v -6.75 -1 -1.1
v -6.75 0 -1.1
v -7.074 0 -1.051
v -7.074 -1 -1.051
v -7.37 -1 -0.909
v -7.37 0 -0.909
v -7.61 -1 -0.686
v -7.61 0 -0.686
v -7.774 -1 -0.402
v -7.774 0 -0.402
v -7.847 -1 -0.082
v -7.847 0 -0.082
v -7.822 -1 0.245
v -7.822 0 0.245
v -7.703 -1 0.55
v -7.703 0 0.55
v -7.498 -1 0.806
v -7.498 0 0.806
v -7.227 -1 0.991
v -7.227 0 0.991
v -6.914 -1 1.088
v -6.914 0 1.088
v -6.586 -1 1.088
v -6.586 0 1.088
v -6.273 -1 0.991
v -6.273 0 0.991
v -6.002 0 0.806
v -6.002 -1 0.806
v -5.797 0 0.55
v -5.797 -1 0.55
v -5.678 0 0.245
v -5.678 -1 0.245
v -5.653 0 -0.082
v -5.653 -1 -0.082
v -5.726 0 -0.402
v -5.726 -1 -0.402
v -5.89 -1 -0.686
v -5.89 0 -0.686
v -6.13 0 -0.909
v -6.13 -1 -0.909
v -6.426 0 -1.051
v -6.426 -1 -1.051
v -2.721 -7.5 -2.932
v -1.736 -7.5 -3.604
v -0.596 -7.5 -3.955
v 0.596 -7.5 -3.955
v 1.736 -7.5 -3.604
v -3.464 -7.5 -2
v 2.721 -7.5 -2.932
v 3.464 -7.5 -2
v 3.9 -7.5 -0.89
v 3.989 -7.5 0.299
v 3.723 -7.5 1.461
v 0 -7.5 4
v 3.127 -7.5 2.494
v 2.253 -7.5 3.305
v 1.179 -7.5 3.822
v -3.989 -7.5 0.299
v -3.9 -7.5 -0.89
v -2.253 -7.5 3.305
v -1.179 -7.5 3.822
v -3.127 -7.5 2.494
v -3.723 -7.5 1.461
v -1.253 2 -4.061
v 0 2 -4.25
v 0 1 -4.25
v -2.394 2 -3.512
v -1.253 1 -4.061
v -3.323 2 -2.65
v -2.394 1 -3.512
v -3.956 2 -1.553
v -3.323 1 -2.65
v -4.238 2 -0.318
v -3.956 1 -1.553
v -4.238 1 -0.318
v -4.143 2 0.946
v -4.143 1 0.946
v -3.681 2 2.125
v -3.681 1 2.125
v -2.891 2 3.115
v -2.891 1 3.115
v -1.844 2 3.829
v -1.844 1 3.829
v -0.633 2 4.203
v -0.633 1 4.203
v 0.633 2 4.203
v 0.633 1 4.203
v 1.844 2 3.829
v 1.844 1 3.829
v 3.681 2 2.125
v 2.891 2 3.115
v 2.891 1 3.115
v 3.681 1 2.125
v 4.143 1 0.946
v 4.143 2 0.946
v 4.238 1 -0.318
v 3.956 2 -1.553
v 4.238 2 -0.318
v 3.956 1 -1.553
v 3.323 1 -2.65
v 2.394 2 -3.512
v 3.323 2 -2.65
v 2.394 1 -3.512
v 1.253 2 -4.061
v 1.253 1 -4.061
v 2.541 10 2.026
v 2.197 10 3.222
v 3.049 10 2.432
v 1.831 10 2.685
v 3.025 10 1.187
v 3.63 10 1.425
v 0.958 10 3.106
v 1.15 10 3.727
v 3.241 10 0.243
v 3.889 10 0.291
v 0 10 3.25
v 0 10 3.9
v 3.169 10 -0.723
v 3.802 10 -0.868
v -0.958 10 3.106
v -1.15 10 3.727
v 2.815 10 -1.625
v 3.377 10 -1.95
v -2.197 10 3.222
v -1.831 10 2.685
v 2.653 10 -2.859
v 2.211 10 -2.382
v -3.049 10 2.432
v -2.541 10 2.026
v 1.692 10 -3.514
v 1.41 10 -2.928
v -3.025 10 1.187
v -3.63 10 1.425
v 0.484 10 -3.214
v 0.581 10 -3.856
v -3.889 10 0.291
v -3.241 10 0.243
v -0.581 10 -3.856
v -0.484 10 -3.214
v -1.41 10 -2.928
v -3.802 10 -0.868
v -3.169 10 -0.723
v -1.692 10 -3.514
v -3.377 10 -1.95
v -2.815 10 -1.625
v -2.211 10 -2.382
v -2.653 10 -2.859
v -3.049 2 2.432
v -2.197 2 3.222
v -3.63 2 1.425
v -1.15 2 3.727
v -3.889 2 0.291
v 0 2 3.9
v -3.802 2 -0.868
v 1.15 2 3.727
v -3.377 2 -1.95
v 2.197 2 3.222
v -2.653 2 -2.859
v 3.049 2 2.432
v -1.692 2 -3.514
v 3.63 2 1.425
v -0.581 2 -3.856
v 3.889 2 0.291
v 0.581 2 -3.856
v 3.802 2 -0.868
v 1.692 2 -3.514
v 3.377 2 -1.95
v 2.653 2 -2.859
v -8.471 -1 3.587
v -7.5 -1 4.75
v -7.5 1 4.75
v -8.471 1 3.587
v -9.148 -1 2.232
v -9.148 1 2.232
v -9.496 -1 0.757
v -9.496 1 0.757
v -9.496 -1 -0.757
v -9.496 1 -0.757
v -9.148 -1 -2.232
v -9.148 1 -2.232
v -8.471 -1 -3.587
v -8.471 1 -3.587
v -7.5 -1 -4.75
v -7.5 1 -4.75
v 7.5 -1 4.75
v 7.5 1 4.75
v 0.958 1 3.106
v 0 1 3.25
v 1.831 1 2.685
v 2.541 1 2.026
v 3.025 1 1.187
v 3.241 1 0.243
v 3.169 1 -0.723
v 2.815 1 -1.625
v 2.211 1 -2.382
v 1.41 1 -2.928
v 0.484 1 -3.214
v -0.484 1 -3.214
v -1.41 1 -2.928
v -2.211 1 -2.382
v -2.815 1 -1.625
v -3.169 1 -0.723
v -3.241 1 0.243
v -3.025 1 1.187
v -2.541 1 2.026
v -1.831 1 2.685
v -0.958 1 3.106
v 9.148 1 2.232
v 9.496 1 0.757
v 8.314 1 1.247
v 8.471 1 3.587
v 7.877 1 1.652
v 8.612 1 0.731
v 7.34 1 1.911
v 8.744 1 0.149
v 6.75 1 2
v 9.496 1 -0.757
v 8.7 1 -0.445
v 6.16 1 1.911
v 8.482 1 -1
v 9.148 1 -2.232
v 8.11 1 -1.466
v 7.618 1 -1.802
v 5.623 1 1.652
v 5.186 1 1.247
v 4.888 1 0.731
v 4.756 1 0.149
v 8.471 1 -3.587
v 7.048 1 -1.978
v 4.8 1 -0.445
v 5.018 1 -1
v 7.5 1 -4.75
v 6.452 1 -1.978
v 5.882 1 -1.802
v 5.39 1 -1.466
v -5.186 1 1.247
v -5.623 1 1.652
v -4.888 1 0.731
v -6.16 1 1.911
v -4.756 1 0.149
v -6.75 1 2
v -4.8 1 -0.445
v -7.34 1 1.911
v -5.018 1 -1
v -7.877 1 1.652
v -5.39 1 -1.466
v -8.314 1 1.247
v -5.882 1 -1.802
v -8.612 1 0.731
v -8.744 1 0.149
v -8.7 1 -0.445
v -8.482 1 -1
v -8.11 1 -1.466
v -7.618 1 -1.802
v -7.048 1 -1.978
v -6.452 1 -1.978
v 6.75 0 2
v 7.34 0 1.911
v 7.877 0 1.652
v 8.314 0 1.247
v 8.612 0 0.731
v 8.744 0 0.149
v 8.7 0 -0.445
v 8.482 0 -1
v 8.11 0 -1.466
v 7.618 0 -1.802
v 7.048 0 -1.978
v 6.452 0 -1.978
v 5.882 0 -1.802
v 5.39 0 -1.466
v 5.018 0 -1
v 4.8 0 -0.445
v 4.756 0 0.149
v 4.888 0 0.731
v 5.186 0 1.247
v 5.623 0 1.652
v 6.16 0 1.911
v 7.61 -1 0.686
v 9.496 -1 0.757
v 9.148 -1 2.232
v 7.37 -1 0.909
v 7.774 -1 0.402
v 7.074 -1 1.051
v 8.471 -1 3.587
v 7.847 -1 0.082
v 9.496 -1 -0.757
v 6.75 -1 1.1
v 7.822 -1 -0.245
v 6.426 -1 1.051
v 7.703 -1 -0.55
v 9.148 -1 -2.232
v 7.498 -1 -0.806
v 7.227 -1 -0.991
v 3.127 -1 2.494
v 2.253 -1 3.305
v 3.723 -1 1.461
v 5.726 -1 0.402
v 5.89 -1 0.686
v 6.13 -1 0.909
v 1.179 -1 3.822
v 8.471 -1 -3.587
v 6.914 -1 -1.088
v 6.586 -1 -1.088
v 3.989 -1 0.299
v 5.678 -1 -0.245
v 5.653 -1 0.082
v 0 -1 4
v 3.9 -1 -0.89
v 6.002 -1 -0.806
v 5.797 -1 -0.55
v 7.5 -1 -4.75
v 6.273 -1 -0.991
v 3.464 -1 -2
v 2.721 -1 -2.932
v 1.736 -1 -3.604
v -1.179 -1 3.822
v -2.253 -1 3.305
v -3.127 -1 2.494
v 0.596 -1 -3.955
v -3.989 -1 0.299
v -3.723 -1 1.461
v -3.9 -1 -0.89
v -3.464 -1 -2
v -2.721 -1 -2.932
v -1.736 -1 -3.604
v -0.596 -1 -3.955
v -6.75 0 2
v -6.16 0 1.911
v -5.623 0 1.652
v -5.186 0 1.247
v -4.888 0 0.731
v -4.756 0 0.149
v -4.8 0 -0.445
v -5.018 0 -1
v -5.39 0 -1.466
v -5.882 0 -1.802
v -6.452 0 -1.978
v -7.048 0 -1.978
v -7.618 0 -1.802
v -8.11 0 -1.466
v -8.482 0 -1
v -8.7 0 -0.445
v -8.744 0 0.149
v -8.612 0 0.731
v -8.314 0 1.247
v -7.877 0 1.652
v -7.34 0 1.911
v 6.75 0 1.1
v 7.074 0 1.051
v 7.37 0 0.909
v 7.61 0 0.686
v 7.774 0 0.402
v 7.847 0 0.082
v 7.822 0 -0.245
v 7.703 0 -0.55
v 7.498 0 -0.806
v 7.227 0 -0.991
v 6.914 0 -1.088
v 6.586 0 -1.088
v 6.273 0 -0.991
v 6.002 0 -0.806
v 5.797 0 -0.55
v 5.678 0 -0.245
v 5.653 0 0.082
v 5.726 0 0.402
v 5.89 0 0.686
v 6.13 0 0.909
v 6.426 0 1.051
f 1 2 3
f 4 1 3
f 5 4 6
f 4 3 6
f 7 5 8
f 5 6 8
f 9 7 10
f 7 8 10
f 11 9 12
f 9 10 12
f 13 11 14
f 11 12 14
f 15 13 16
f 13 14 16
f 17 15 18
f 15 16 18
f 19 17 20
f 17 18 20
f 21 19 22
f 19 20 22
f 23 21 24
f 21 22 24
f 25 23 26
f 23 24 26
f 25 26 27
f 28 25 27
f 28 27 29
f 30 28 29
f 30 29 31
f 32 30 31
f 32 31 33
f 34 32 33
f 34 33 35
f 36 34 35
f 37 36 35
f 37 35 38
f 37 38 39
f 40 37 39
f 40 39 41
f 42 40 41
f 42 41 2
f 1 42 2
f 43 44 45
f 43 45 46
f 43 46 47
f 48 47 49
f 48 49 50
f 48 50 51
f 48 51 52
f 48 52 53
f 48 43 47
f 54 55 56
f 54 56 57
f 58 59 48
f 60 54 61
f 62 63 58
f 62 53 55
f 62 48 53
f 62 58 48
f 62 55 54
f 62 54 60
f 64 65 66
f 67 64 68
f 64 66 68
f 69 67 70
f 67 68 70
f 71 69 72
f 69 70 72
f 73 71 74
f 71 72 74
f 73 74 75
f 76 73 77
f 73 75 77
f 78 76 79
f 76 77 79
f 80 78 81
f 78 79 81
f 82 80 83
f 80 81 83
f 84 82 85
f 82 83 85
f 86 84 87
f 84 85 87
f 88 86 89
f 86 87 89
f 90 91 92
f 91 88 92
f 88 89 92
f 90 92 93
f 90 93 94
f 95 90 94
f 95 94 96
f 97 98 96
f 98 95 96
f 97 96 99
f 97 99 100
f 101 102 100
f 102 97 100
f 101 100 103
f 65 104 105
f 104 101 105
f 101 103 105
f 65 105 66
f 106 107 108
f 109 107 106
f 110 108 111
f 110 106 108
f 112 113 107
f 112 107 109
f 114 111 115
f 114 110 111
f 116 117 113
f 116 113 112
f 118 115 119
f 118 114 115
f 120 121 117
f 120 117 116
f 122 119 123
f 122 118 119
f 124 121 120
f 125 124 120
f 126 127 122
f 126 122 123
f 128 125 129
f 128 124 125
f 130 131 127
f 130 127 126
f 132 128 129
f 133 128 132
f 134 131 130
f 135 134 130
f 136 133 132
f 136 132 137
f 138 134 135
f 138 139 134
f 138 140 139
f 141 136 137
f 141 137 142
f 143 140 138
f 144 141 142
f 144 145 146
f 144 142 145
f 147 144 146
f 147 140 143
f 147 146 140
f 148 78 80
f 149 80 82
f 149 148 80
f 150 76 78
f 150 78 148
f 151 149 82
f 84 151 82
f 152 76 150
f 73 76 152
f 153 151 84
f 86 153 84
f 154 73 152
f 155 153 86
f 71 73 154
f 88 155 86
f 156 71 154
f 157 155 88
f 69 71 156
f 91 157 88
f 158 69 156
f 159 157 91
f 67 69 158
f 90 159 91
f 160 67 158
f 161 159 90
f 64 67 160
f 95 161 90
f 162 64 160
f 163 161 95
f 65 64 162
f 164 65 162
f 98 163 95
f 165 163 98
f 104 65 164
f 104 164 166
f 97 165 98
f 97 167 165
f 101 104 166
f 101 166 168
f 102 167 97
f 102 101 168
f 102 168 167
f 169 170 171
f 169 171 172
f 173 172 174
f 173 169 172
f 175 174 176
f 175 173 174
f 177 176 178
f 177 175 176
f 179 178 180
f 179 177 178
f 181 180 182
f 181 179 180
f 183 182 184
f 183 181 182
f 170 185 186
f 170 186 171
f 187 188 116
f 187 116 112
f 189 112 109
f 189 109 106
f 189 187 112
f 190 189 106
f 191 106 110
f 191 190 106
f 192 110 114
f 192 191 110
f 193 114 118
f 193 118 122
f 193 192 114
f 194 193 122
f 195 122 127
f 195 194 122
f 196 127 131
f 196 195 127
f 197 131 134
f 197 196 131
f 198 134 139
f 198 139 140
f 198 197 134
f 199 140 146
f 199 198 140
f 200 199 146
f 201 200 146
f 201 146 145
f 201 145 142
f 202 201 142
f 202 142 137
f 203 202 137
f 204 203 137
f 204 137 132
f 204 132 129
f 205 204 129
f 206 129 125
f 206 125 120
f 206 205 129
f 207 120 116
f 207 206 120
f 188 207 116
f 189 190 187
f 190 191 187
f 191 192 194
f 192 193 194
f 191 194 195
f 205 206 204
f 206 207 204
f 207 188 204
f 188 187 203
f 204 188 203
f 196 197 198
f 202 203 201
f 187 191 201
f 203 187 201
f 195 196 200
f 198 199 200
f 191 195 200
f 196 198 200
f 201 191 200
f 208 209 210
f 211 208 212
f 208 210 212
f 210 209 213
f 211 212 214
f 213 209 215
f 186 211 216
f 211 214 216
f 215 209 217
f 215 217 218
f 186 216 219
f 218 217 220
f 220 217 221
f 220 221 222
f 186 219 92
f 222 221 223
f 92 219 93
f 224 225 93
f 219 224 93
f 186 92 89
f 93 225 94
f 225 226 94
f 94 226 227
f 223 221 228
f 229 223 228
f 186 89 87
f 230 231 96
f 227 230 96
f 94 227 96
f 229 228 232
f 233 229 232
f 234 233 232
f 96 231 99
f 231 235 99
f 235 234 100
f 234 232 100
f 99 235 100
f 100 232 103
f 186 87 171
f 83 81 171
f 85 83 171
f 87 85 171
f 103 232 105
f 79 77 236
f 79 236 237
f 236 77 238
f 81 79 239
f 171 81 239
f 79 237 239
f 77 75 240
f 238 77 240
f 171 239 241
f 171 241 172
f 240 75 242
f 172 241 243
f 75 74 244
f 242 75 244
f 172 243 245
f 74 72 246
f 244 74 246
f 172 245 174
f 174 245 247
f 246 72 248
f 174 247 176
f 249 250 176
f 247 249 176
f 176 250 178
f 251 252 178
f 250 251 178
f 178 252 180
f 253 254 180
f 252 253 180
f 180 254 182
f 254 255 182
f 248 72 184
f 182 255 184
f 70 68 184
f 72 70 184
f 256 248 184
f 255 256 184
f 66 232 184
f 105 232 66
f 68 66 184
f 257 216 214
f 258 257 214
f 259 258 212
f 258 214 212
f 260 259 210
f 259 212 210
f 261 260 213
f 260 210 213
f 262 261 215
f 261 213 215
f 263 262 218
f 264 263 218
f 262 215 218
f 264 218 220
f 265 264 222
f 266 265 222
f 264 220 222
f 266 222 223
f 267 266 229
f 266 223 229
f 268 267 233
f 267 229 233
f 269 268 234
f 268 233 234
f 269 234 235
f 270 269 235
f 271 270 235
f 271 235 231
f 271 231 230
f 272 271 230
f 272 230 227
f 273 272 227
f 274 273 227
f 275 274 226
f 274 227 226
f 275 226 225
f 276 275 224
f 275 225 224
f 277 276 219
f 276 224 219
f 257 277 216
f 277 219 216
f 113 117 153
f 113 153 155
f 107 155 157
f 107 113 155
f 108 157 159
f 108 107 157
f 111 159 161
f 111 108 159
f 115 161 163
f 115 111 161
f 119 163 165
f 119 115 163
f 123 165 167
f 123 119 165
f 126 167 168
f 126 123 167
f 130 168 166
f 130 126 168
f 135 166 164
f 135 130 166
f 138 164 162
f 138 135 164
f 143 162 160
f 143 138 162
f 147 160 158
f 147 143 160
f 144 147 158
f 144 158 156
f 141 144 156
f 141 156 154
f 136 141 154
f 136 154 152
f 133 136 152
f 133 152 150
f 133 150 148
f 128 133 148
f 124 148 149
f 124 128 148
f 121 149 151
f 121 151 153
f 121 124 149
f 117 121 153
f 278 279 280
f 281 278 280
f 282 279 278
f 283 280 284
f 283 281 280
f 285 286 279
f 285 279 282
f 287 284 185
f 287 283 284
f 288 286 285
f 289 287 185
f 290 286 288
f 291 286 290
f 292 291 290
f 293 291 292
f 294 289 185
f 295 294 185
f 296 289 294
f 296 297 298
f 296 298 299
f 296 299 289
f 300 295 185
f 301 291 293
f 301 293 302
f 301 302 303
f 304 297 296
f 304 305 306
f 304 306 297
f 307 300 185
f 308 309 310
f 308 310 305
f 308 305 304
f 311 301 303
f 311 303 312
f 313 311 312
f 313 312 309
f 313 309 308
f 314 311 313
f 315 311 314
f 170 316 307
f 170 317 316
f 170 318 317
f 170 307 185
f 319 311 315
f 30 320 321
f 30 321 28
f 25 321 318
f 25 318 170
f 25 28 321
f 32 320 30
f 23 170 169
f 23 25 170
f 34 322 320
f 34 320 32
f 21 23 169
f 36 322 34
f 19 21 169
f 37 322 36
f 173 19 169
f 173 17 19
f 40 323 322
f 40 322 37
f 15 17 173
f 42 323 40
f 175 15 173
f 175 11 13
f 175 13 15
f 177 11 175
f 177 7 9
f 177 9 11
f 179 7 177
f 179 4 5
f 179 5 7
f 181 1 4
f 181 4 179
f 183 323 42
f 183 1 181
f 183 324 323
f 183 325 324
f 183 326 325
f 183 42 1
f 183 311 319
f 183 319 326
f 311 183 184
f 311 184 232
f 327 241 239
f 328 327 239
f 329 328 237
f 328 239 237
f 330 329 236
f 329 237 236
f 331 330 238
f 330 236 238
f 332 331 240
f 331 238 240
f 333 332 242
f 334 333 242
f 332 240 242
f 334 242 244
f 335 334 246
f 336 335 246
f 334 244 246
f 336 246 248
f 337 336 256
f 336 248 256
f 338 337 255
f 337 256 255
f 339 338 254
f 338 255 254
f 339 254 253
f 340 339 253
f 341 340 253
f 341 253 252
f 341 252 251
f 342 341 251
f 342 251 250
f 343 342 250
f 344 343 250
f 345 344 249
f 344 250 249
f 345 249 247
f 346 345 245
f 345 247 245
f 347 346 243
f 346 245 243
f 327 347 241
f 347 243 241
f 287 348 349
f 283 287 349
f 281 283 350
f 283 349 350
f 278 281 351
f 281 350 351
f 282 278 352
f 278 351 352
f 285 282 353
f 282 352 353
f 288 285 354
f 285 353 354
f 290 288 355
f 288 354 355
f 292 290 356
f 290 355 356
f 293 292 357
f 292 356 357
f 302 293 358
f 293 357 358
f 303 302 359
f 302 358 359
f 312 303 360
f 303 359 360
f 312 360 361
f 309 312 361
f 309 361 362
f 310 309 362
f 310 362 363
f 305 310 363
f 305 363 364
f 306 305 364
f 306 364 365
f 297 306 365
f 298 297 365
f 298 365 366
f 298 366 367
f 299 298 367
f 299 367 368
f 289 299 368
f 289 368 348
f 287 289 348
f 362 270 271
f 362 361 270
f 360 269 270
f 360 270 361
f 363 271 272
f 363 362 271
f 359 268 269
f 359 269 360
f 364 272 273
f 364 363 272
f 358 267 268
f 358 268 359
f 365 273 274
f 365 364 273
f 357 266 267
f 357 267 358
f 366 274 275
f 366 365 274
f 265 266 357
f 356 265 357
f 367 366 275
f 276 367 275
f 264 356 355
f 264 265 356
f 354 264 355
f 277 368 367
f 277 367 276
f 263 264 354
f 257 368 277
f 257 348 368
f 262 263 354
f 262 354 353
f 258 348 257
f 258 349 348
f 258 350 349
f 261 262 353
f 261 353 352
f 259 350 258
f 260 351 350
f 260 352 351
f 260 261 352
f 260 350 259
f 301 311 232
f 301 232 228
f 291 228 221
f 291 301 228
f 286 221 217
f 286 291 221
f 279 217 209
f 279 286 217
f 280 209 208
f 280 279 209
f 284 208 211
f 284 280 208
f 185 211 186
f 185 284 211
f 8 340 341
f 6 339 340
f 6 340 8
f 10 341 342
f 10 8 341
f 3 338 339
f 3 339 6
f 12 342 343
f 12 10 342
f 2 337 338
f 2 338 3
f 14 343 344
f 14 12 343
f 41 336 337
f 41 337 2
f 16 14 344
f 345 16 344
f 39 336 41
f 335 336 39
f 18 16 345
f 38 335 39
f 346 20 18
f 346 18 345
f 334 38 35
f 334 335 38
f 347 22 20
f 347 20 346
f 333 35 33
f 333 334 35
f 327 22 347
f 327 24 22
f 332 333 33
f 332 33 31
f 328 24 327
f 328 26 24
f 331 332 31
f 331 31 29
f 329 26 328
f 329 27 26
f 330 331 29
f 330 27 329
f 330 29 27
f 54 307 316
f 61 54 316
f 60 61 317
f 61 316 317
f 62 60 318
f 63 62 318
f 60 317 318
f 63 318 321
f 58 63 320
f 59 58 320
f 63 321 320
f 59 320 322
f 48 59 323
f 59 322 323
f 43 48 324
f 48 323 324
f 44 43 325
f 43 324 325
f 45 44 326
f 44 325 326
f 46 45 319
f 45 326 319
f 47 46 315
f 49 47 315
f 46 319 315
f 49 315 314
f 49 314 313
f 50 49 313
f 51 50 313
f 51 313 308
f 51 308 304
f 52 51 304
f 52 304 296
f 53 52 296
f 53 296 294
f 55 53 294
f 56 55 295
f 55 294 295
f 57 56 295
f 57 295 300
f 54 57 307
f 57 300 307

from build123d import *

# Parameters (mm, degrees)
EXTRUDE_1_DEPTH      = 1
EXTRUDE_1_DEPTH_BACK = 1
SKETCH_2_R           = 4.25
SKETCH_2_R_2         = 3.25
EXTRUDE_2_DEPTH      = 9
SKETCH_3_R           = 1.1
CUT_EXTRUDE_1_DEPTH  = 14.948989624
SKETCH_8_R           = 2
CUT_EXTRUDE_3_DEPTH  = 1
SKETCH_4_R           = 4
EXTRUDE_1_2_DEPTH    = 6.5
SKETCH_5_OUTSIDE_W   = 26.596
SKETCH_5_OUTSIDE_H   = 17.016
SKETCH_5_OUTSIDE_R   = 3.9
CUT_EXTRUDE_2_DEPTH  = 8


with BuildPart() as part:
    # 草图1 → Extrude 1 (new, two sides: drawn at the far end of the back side and taken through both)
    with BuildSketch(Plane(origin=(0, 0, 0), x_dir=(1, 0, 0), z_dir=(0, 1, 0)).offset(-EXTRUDE_1_DEPTH_BACK)):
        with BuildLine():
            Line((-7.5, 4.75), (7.5, 4.75))
            ThreePointArc((7.5, 4.75), (9.540011086, 0), (7.5, -4.75))
            Line((7.5, -4.75), (-7.5, -4.75))
            ThreePointArc((-7.5, -4.75), (-9.540011086, 0), (-7.5, 4.75))
        make_face()
    extrude(amount=EXTRUDE_1_DEPTH + EXTRUDE_1_DEPTH_BACK)

    # 草图2 → Extrude 2 (add)
    with BuildSketch(Plane(origin=(0, 1, 0), x_dir=(-1, 0, 0), z_dir=(0, 1, 0))):
        with Locations(Location((0, 0, 0), (0, 0, 270))):
            Circle(SKETCH_2_R)
        with Locations(Location((0, 0, 0), (0, 0, 90))):
            Circle(SKETCH_2_R_2, mode=Mode.SUBTRACT)
    extrude(amount=EXTRUDE_2_DEPTH)

    # 草图3 → 切除-拉伸1 (cut, through all)
    with BuildSketch(Plane(origin=(0, 1, 0), x_dir=(-1, 0, 0), z_dir=(0, 1, 0))):
        with Locations(Location((-6.75, 0, 0), (0, 0, 90))):
            Circle(SKETCH_3_R)
        with Locations(Location((6.75, 0, 0), (0, 0, 270))):
            Circle(SKETCH_3_R)
    extrude(amount=-CUT_EXTRUDE_1_DEPTH, mode=Mode.SUBTRACT)

    # 草图8 → 切除-拉伸3 (cut)
    with BuildSketch(Plane(origin=(0, 1, 0), x_dir=(1, 0, 0), z_dir=(0, 1, 0))):
        with Locations(Location((-6.75, 0, 0), (0, 0, 270))):
            Circle(SKETCH_8_R)
        with Locations(Location((6.75, 0, 0), (0, 0, 270))):
            Circle(SKETCH_8_R)
    extrude(amount=-CUT_EXTRUDE_3_DEPTH, mode=Mode.SUBTRACT)

    # 草图4 → Extrude 1 2 (add)
    with BuildSketch(Plane.XZ.offset(1)):
        with Locations(Location((0, 0, 0), (0, 0, 90))):
            Circle(SKETCH_4_R)
    extrude(amount=EXTRUDE_1_2_DEPTH)

    # 草图5 outside → 切除-拉伸2 (cut)
    with BuildSketch(Plane(origin=(0, 10, 0), x_dir=(1, 0, 0), z_dir=(0, 1, 0))):
        Rectangle(SKETCH_5_OUTSIDE_W, SKETCH_5_OUTSIDE_H)
        with Locations(Location((0, 0, 0), (0, 0, 270))):
            Circle(SKETCH_5_OUTSIDE_R, mode=Mode.SUBTRACT)
    extrude(amount=-CUT_EXTRUDE_2_DEPTH, mode=Mode.SUBTRACT)


solid = part.part
